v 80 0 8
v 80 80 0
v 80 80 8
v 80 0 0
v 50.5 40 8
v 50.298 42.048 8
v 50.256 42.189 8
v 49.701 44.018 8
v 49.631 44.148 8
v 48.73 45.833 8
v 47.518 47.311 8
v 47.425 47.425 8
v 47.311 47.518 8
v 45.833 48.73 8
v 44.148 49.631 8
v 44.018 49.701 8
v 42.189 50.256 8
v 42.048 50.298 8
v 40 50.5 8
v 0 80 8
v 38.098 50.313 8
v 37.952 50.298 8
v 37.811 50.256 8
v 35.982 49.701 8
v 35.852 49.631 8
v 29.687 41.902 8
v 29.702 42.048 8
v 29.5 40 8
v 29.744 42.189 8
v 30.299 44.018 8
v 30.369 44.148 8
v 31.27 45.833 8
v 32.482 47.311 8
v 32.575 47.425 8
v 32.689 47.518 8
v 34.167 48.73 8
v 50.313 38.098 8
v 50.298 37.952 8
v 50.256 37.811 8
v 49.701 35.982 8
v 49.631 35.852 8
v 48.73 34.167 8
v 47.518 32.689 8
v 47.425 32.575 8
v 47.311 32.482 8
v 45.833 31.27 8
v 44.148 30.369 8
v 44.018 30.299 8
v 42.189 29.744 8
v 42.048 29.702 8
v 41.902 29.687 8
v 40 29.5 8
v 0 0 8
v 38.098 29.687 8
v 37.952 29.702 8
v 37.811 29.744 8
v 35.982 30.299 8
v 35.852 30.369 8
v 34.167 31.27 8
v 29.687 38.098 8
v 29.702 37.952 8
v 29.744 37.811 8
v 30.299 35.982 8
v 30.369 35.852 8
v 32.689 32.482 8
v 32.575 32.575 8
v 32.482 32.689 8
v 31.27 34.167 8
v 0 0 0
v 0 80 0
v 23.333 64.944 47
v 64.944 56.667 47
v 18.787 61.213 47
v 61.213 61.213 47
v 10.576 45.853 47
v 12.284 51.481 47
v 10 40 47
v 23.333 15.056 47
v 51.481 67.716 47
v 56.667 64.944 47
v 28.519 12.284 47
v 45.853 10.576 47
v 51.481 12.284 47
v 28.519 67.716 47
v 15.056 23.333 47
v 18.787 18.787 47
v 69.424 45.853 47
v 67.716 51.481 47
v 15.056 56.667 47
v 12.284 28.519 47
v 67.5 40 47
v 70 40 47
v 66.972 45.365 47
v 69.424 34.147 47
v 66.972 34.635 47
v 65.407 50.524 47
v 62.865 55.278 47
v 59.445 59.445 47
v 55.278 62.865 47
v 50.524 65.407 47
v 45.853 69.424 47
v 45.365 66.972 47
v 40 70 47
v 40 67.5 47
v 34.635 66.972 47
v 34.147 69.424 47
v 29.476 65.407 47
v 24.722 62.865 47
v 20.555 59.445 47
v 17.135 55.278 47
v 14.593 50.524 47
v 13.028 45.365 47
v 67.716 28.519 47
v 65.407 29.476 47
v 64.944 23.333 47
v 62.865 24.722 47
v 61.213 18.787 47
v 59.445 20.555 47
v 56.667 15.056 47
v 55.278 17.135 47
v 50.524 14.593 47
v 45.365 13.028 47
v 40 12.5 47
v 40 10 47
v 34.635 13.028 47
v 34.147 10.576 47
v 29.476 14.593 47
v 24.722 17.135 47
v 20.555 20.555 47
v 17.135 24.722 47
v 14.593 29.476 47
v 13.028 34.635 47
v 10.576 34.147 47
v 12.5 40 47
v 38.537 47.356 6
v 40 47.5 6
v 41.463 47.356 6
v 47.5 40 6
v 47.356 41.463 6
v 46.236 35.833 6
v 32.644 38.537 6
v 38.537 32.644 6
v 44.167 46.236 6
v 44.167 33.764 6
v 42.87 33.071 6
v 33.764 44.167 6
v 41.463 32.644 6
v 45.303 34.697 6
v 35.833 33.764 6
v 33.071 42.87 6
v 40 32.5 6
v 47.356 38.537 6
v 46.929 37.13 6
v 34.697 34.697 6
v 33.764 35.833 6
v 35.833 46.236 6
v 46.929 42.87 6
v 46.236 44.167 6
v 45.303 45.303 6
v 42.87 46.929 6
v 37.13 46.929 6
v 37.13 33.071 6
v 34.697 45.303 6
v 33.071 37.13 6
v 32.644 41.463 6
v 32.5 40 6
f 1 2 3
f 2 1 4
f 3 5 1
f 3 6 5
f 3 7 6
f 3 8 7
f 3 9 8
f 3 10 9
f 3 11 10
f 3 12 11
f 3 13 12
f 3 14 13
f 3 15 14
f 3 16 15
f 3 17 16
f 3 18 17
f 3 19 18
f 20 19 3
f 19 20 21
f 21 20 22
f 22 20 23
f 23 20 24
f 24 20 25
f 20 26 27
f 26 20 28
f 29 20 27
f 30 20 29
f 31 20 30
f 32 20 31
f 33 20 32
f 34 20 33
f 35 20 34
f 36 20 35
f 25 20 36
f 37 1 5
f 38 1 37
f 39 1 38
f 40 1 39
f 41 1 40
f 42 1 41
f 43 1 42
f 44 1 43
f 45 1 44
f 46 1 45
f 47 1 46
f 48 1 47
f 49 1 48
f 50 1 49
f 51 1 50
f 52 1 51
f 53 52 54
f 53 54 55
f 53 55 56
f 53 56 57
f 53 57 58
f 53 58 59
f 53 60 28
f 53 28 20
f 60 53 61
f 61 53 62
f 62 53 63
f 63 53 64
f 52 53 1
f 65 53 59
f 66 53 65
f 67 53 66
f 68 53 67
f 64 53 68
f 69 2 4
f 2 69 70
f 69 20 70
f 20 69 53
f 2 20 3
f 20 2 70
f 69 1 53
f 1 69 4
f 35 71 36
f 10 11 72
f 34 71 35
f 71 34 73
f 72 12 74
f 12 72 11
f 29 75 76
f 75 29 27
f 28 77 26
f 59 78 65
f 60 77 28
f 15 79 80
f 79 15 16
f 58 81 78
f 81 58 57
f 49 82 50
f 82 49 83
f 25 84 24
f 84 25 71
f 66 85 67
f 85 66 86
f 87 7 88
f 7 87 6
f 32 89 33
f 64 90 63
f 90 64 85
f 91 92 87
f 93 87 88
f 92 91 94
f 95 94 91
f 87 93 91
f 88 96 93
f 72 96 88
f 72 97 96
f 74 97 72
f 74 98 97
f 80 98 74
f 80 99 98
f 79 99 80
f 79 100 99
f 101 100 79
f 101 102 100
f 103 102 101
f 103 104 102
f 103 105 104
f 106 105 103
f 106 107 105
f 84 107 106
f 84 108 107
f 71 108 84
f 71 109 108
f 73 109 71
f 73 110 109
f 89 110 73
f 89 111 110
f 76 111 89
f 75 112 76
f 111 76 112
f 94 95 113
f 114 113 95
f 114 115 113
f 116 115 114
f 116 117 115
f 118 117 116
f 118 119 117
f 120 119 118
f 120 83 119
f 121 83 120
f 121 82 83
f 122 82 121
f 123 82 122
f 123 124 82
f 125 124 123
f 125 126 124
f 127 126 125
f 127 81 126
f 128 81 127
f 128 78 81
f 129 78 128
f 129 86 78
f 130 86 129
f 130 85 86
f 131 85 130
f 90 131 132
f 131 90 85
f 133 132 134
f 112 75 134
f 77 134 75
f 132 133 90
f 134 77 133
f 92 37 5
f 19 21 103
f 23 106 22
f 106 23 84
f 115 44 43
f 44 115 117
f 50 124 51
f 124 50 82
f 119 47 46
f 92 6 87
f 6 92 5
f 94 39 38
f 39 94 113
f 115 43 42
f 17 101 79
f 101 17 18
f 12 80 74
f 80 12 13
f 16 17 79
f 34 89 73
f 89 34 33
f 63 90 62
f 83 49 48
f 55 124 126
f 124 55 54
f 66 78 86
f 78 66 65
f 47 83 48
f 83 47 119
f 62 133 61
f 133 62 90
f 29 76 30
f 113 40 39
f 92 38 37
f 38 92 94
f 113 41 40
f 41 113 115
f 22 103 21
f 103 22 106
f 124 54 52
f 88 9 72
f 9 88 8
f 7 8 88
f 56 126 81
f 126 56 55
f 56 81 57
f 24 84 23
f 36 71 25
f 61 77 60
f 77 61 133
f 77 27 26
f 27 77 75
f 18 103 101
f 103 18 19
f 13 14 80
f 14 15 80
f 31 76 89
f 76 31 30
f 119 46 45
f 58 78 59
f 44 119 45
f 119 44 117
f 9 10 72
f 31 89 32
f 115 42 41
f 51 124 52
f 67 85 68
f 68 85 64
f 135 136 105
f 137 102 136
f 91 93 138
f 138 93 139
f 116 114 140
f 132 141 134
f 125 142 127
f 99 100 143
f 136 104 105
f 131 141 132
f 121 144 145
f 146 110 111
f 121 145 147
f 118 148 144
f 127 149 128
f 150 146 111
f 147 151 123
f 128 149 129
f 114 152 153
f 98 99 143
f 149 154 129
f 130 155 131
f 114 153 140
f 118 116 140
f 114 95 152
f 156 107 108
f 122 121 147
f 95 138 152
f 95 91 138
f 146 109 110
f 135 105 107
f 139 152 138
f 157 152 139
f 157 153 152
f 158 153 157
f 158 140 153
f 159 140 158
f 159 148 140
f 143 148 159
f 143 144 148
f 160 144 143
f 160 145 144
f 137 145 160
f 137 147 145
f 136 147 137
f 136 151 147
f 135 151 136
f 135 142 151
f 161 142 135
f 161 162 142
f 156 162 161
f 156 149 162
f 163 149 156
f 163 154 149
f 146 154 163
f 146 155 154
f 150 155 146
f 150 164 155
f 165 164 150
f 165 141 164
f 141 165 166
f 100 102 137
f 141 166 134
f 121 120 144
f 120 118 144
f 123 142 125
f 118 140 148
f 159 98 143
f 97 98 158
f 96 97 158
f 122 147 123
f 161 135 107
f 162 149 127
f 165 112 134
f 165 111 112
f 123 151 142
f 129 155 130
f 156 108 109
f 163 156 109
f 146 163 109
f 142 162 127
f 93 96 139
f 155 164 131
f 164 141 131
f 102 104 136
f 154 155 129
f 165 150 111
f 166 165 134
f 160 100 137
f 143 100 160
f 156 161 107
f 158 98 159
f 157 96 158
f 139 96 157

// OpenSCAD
$fn = 32;

// ----------------------------------------------------------------------
// Hopper: funnel with square flange
// ----------------------------------------------------------------------

// --- parameters (mm) ---
fl = 80;                  // flange side, X and Y
fl_t = 8;                 // flange thickness
cone_h = 40;              // cone height above the flange
top_d = 60;               // cone mouth diameter
bot_d = 20;               // cone spout diameter
wall = 2.5;               // cone wall thickness
fit_tol = 0.1;            // tolerance for press fits, mm
free_tol = 0.3;           // tolerance for clearance fits, mm

bore_d = bot_d - 2 * wall;  // spout bore diameter
total_h = fl_t + cone_h - 1;  // overall height

difference() {
  union() {
    cube([fl, fl, fl_t]);
    translate([fl / 2, fl / 2, fl_t - 1])
      cylinder(h = cone_h, d1 = bot_d, d2 = top_d);
  }
  translate([fl / 2, fl / 2, fl_t - 2])
    cylinder(h = cone_h + 1, d1 = bore_d, d2 = top_d - 2 * wall);
}
